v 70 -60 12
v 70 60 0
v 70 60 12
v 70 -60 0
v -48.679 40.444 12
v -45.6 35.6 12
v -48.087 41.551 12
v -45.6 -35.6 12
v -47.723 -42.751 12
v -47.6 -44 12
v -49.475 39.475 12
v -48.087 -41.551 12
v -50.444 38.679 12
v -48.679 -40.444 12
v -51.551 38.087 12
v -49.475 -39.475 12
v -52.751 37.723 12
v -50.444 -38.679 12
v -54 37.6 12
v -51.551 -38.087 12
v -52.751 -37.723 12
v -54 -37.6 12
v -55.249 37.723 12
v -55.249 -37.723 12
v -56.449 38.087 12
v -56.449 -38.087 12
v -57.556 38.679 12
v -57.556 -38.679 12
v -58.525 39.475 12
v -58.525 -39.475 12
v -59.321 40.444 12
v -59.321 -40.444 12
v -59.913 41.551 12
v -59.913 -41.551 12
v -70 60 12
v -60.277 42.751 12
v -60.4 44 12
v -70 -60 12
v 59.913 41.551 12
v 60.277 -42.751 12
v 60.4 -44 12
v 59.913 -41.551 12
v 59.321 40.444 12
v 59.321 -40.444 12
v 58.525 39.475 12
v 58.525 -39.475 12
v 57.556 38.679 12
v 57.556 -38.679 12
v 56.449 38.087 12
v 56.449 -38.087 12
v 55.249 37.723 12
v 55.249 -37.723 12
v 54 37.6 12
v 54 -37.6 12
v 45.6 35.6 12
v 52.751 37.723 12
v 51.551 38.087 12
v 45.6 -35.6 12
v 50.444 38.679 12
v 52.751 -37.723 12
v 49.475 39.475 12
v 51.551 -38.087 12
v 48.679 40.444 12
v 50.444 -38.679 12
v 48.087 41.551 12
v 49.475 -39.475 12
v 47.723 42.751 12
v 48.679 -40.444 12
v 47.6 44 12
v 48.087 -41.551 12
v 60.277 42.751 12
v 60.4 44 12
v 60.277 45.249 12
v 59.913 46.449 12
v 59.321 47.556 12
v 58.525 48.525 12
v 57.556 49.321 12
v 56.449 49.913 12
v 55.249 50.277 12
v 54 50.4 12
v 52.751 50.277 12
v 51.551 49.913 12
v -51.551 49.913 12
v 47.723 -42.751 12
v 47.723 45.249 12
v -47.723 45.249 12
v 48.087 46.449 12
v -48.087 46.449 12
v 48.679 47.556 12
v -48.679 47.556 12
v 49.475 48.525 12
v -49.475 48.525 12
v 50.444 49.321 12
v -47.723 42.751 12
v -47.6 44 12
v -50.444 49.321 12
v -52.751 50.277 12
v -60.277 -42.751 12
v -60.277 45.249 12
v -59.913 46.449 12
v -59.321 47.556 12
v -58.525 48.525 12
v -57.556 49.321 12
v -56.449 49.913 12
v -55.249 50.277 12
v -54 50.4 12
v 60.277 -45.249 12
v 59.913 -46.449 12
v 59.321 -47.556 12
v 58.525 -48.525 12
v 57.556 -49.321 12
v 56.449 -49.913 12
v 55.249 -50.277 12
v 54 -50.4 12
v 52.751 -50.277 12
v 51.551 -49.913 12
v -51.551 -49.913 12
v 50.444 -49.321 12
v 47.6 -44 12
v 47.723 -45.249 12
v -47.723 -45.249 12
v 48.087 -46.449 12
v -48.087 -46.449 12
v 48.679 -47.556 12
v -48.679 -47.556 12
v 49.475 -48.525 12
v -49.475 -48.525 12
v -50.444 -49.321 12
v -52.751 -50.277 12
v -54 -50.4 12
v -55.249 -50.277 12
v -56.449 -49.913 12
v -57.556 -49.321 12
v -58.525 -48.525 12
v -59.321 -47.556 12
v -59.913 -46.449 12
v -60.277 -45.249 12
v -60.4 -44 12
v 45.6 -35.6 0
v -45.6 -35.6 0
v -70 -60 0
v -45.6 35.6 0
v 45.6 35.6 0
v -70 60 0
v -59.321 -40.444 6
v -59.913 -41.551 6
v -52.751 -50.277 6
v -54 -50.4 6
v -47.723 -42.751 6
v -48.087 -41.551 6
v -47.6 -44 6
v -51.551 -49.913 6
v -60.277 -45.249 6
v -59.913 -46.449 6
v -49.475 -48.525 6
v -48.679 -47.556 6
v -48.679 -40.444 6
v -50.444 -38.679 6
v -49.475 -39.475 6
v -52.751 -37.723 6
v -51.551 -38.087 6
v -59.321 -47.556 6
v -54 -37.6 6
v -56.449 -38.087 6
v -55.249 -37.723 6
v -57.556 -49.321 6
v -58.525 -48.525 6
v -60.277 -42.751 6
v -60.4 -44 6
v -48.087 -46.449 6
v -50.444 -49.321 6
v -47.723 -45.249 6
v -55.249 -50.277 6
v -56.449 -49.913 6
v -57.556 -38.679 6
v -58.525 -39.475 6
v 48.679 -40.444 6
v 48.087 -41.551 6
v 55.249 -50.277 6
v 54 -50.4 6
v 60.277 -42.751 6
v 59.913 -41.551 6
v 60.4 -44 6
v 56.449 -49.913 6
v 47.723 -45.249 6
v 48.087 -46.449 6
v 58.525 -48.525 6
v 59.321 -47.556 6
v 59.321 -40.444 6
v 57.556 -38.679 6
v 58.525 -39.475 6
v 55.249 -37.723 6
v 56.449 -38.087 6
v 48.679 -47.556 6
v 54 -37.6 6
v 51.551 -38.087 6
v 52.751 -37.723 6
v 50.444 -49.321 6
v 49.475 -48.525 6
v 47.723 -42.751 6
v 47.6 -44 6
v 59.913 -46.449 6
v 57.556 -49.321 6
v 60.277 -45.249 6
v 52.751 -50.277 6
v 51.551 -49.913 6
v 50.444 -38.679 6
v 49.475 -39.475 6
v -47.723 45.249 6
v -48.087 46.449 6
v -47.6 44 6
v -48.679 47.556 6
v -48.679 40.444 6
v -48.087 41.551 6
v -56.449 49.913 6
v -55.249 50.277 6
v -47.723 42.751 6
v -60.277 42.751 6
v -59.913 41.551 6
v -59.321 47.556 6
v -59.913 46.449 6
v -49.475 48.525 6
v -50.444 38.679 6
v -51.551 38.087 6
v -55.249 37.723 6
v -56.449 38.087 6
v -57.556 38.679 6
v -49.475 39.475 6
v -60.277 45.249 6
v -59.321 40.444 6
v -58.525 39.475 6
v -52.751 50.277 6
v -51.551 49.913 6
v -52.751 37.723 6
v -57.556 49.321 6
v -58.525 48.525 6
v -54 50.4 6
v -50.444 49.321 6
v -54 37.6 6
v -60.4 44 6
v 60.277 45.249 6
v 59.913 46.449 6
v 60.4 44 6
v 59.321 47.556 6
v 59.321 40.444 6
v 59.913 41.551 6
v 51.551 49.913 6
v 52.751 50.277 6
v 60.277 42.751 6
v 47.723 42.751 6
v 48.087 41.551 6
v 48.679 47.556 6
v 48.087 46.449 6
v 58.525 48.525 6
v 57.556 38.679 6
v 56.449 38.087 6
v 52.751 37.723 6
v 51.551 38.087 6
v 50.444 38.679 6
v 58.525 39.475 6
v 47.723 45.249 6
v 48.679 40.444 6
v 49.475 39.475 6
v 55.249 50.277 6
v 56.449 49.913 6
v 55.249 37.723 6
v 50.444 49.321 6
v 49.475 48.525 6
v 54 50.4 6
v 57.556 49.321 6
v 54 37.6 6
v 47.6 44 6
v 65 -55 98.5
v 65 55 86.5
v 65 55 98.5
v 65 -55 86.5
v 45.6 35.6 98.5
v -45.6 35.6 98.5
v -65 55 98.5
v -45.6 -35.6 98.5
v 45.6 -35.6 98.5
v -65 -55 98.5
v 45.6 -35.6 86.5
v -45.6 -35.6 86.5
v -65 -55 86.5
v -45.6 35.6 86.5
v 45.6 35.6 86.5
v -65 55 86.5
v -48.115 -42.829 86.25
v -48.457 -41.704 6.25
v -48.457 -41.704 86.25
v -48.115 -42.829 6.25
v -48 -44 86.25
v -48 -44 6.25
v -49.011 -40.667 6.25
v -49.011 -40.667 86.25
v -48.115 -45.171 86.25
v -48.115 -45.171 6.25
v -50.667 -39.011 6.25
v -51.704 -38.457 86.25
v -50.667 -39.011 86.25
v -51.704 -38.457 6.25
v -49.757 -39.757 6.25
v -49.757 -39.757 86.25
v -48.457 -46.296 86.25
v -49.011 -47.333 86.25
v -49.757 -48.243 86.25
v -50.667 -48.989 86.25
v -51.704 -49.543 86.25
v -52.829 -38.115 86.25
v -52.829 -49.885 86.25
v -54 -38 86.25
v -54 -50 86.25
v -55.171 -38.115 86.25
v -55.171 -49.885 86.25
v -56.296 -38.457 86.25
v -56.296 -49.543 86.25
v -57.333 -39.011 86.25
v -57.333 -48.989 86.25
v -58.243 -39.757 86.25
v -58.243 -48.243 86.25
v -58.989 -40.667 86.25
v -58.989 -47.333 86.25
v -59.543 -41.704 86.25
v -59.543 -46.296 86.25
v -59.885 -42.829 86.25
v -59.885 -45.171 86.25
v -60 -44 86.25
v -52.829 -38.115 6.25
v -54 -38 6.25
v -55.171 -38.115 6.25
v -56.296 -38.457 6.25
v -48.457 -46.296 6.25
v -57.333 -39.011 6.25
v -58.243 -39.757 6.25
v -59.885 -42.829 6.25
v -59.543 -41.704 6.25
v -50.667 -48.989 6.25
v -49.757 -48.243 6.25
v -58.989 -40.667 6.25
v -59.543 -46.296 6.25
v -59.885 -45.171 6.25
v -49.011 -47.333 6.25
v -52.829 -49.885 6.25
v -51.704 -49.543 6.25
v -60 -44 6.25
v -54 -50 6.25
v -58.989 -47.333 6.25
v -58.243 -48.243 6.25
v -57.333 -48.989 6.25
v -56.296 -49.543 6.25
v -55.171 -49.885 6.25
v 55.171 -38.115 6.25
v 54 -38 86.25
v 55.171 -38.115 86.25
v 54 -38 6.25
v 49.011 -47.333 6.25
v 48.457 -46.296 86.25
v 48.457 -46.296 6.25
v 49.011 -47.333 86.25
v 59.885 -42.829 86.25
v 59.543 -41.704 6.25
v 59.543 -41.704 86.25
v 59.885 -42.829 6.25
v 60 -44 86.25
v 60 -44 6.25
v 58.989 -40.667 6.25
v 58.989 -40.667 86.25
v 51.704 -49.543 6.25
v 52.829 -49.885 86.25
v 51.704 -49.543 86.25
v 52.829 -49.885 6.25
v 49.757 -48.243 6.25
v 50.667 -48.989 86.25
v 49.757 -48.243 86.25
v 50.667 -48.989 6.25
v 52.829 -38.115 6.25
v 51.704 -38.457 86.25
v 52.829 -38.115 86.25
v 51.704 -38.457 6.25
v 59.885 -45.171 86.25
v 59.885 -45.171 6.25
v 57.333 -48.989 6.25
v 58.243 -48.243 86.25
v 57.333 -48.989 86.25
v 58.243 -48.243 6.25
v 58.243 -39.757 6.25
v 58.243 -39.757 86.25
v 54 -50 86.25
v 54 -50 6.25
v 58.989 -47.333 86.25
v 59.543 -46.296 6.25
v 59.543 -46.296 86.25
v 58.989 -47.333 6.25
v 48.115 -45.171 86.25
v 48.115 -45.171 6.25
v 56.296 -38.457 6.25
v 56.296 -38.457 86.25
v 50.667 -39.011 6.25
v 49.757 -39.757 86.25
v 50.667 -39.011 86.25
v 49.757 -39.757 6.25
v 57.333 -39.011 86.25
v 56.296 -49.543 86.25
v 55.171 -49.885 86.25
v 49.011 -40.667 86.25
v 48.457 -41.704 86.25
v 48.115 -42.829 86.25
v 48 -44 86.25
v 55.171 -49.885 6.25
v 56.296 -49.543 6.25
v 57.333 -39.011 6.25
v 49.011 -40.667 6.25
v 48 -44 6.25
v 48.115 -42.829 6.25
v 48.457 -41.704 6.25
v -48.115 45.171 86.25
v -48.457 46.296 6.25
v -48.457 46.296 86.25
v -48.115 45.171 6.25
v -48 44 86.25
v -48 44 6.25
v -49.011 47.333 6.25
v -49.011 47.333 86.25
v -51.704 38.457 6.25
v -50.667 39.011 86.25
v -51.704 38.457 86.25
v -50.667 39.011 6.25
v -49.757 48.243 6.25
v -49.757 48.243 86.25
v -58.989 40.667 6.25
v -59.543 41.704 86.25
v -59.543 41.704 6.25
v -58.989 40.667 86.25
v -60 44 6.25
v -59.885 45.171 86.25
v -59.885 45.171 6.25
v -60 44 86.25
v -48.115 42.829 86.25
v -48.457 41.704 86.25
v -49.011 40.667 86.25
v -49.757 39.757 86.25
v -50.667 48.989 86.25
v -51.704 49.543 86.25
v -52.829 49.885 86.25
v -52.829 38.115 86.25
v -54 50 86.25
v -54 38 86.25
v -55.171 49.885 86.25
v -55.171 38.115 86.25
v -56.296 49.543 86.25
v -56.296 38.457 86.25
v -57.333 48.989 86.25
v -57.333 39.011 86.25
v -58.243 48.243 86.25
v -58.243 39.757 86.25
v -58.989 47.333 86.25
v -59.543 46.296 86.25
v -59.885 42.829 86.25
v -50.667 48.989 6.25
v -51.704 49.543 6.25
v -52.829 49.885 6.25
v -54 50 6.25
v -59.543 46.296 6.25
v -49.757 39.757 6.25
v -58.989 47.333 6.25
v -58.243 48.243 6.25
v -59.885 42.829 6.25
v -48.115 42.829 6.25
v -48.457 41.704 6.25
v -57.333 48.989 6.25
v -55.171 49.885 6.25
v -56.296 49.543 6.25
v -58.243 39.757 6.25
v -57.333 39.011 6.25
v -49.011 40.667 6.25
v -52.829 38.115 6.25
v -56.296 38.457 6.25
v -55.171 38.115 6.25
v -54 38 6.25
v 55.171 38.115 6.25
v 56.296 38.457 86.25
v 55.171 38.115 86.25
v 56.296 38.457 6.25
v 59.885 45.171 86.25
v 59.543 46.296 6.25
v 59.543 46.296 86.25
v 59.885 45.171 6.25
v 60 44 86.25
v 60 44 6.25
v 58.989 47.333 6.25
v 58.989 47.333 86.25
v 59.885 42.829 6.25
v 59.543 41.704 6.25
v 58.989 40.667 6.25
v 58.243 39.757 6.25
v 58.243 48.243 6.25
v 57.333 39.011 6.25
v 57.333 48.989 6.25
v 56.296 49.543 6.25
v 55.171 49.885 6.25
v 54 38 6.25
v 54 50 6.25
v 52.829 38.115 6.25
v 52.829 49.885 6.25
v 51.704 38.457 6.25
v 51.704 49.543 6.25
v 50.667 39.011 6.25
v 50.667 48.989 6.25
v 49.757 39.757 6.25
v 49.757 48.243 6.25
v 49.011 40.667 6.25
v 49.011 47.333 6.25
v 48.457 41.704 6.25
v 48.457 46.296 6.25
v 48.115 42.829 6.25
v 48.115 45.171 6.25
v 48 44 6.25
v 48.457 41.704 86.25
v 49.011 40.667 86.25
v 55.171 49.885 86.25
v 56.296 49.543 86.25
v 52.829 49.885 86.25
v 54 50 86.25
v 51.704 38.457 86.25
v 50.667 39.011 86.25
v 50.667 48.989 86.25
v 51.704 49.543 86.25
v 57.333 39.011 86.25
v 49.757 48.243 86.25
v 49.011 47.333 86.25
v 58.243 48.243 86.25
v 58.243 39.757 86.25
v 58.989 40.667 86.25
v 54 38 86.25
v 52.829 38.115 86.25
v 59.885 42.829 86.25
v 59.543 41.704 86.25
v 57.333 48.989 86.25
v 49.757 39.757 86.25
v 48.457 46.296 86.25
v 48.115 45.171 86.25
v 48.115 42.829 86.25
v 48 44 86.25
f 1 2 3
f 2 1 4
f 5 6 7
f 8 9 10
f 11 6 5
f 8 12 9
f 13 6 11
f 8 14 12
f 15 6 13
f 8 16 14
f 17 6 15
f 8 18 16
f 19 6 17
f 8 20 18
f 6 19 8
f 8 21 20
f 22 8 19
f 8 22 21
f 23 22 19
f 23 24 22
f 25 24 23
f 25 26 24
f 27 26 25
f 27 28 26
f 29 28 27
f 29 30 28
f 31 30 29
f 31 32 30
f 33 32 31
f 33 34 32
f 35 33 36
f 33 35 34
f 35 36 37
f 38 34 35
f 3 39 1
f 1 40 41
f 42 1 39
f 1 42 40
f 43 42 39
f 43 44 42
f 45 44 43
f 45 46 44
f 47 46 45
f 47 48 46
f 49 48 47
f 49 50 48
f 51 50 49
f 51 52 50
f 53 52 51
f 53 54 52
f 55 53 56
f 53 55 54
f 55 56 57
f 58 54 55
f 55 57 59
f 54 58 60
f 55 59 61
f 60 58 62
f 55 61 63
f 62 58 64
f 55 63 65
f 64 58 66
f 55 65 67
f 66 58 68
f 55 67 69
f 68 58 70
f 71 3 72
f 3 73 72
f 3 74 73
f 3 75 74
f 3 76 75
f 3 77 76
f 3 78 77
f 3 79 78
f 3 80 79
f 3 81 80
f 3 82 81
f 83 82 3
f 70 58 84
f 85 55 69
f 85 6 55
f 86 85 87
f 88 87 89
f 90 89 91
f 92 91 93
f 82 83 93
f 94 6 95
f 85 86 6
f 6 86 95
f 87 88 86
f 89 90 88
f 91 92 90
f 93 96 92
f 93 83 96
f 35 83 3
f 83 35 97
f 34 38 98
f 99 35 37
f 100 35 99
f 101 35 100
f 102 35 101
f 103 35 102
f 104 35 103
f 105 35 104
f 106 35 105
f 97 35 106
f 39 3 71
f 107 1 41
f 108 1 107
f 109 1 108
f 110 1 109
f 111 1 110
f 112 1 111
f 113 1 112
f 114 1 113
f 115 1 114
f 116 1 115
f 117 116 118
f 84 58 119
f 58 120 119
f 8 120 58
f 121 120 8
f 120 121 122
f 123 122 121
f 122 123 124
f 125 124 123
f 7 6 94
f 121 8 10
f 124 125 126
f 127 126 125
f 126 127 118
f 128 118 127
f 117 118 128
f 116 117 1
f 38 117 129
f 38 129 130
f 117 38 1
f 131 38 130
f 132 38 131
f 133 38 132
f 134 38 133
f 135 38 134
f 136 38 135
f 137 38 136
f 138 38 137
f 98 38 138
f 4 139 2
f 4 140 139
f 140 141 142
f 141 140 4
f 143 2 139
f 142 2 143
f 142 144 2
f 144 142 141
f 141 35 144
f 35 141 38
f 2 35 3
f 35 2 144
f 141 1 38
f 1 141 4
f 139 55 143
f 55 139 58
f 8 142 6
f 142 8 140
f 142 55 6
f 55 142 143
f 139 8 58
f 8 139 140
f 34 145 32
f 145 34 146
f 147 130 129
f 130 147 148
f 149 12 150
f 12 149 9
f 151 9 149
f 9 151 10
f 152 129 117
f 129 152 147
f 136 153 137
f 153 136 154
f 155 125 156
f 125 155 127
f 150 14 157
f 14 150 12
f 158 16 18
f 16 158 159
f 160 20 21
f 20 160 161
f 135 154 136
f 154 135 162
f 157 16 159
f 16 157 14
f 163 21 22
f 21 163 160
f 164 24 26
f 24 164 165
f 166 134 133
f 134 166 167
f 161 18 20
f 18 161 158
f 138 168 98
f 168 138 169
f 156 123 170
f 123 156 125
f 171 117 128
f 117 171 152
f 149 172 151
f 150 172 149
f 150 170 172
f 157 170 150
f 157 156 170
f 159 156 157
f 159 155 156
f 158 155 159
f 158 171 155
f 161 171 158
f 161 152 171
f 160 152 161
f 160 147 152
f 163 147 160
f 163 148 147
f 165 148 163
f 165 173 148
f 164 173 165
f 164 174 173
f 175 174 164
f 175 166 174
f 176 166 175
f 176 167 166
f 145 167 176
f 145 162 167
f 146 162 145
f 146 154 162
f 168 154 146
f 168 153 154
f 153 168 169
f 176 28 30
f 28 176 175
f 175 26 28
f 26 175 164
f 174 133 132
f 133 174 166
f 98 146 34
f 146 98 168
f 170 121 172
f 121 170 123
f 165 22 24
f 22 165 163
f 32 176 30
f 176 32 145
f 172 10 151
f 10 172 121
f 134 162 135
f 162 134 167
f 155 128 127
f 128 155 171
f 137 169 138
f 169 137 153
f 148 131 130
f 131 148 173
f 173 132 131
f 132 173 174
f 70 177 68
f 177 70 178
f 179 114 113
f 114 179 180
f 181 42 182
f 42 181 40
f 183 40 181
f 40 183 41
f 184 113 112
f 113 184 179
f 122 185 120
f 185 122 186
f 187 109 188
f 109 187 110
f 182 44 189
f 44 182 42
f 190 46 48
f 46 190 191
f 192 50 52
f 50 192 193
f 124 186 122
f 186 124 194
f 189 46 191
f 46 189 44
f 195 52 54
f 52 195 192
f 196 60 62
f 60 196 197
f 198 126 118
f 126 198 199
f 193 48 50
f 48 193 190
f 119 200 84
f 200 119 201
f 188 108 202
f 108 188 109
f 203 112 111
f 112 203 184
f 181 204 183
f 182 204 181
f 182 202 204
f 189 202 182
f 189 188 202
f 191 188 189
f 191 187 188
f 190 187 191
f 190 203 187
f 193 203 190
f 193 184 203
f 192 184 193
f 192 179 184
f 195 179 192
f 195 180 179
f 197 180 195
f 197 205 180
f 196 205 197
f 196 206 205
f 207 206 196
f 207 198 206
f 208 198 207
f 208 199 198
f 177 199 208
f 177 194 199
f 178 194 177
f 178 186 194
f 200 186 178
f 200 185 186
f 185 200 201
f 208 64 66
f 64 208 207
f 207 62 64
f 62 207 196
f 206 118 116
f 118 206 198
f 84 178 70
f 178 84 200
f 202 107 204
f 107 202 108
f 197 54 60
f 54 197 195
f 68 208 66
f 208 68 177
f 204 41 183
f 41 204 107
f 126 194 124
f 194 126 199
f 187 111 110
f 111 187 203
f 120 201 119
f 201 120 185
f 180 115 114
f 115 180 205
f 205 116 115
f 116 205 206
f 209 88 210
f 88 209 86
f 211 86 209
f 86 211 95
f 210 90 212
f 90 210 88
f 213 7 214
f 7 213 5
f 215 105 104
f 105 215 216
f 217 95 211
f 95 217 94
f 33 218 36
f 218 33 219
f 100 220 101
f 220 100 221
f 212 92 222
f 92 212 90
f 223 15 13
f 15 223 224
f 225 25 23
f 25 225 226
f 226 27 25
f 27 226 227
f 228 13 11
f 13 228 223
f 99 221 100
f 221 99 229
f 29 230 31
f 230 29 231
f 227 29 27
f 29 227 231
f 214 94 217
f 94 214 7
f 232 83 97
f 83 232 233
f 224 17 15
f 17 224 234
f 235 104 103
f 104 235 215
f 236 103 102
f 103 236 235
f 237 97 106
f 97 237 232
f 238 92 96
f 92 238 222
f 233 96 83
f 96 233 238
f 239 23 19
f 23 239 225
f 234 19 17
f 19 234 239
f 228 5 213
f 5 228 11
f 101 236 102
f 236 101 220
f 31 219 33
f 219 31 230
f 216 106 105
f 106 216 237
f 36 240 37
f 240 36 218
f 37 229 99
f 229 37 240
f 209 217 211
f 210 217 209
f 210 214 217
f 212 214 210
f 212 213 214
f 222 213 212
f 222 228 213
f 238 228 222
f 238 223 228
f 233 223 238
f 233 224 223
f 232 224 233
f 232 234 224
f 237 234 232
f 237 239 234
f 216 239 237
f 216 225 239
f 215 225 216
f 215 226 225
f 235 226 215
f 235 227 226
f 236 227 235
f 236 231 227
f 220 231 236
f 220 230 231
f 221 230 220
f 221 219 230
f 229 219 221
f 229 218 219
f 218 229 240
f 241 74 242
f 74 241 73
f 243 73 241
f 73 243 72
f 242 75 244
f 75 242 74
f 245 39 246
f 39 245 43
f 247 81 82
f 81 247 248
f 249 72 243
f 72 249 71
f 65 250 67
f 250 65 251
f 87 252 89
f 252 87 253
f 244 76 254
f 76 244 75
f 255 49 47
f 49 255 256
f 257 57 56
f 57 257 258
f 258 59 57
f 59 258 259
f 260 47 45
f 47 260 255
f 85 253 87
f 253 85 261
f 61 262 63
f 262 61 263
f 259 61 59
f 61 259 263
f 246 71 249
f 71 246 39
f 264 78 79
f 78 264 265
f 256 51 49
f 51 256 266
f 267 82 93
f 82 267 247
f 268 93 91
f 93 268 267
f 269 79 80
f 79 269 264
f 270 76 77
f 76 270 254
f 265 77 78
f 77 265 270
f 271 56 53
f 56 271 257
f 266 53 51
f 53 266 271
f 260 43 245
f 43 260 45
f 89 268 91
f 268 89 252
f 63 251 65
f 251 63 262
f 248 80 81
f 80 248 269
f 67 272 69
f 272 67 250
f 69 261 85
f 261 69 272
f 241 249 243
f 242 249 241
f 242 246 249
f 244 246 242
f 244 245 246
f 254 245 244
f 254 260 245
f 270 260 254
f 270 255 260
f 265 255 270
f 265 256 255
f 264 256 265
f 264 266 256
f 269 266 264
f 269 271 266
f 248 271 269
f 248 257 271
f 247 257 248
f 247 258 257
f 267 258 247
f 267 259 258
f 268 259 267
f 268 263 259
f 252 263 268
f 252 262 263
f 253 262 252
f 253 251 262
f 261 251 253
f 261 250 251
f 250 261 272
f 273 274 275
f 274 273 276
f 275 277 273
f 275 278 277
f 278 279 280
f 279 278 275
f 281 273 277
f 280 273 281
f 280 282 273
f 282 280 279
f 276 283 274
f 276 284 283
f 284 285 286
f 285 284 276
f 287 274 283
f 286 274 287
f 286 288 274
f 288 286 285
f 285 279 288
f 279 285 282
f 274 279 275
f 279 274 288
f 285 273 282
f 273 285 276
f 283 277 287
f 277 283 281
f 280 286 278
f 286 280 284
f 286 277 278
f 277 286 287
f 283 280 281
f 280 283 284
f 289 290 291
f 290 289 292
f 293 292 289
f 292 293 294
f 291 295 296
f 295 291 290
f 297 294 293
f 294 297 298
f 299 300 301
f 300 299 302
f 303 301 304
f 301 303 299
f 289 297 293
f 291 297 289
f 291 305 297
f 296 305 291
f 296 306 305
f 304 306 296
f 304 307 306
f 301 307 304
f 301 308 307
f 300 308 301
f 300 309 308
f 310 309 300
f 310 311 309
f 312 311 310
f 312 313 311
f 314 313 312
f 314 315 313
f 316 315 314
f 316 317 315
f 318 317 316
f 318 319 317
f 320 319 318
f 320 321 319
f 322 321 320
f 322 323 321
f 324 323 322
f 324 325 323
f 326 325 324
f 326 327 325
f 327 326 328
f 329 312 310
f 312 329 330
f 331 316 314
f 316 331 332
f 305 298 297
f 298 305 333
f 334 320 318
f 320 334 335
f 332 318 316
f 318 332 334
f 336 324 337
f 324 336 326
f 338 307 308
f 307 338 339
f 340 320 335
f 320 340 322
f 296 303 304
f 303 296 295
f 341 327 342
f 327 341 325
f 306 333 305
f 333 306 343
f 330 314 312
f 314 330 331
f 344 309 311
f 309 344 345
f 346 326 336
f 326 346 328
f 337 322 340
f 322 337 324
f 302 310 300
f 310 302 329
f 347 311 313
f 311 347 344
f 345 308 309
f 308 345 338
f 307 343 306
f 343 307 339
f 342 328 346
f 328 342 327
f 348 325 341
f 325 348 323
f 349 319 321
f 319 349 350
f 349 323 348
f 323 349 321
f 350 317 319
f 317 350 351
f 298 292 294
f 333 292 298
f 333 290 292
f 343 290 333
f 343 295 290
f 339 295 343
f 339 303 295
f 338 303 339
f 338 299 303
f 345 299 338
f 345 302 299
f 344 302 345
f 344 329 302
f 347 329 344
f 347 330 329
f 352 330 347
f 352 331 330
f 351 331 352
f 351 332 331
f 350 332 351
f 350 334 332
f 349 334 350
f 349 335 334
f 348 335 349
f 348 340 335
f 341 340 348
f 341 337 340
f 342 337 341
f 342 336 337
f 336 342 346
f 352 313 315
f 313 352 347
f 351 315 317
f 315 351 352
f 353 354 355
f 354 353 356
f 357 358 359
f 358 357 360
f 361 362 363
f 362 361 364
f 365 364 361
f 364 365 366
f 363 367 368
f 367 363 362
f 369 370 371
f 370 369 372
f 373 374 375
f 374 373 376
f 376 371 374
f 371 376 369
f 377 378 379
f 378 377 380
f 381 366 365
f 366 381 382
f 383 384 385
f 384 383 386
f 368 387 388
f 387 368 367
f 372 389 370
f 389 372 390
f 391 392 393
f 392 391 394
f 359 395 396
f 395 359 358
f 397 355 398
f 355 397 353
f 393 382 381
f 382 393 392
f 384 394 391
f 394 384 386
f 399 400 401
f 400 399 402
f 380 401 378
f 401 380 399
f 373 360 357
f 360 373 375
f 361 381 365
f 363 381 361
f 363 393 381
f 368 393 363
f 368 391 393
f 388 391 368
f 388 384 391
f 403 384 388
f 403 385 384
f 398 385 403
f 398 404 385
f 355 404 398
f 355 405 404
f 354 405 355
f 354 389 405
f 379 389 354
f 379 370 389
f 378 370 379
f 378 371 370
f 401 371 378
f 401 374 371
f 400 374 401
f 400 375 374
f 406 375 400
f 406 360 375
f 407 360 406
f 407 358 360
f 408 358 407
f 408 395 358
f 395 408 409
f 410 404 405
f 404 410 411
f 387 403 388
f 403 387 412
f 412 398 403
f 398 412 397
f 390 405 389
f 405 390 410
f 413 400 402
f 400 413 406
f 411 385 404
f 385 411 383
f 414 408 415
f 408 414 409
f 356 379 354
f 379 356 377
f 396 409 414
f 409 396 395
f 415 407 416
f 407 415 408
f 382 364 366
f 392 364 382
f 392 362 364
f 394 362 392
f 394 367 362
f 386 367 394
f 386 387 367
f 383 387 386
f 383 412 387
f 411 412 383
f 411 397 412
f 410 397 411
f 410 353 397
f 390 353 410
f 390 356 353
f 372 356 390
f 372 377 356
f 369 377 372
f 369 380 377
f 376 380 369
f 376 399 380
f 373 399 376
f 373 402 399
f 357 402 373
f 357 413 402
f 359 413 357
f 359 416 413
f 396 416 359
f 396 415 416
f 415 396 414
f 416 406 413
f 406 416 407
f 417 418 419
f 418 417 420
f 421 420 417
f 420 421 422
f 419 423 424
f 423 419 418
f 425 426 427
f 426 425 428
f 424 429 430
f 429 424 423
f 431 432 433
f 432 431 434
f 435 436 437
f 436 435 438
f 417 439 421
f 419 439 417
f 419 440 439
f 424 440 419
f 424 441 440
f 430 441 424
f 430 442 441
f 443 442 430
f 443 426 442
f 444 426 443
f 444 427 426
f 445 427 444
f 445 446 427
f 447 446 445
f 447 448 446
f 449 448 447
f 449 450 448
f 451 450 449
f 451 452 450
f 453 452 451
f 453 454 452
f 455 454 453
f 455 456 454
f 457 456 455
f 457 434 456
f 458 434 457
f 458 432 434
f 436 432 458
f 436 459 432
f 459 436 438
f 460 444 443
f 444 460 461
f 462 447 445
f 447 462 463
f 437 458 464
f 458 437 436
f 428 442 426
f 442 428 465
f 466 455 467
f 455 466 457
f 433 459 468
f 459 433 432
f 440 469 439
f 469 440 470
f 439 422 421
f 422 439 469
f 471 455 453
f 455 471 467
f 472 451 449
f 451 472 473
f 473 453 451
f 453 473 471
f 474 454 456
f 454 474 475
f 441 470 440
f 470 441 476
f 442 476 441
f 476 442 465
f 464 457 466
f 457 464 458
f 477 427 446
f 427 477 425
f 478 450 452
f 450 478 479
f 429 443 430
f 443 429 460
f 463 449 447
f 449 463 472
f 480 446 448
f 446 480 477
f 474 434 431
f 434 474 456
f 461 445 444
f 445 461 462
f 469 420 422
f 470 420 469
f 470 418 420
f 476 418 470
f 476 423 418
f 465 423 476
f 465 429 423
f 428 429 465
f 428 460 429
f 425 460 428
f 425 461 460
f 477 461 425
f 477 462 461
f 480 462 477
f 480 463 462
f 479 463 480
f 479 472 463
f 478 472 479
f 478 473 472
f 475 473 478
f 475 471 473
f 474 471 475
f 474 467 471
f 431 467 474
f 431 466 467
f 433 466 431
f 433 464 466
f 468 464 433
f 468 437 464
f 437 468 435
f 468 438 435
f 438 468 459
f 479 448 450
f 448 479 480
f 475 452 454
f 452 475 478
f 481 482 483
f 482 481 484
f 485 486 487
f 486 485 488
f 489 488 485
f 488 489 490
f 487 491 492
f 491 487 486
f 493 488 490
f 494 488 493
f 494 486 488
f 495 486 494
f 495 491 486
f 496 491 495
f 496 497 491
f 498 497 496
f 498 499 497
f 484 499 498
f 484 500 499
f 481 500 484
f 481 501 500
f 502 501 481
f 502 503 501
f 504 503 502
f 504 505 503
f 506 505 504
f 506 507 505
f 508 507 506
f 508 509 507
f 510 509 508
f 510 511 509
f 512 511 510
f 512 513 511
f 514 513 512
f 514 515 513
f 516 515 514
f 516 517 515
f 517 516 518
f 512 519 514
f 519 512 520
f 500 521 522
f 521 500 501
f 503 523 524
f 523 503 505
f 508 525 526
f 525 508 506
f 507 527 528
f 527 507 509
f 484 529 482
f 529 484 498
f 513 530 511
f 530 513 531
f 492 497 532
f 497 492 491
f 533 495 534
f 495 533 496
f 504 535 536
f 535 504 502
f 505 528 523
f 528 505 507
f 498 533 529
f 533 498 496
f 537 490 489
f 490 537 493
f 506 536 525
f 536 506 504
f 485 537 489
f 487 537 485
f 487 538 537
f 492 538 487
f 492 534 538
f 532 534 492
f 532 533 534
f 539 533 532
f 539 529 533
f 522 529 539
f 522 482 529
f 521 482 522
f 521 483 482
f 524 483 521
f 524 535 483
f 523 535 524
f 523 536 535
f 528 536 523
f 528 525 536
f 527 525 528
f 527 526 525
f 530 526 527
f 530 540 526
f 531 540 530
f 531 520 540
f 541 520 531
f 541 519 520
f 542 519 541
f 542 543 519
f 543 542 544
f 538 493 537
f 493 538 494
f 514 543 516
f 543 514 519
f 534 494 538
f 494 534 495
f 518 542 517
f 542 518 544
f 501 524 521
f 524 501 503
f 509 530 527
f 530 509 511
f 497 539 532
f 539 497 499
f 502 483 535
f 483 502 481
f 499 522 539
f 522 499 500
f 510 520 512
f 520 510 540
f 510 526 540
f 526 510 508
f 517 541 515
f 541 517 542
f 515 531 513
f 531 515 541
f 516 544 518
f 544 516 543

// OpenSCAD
$fn = 32;

// ------------------------------------------------------------------------
// Frame cube: base 140 x 120 mm, posts 80 mm tall
// Every part is its own module, assembly() places every instance.
// ------------------------------------------------------------------------

// --- part 1 ---
module base_frame() {
  difference() {
    translate([-70, -60, 0]) cube([140, 120, 12]);
    translate([-45.6, -35.6, -1]) cube([91.2, 71.2, 14]);
    translate([-54, -44, 6]) cylinder(h = 7, d = 12.8);
    translate([54, -44, 6]) cylinder(h = 7, d = 12.8);
    translate([-54, 44, 6]) cylinder(h = 7, d = 12.8);
    translate([54, 44, 6]) cylinder(h = 7, d = 12.8);
  }
}

// --- part 2 ---
module corner_post() {
  cylinder(h = 80, d = 12);
}

// --- part 3 ---
module top_frame() {
  difference() {
    translate([-65, -55, 0]) cube([130, 110, 12]);
    translate([-45.6, -35.6, -1]) cube([91.2, 71.2, 14]);
  }
}

// --- assembly ---
module assembly() {
  color([0.80, 0.24, 0.20]) translate([0, 0, 0]) rotate([0, 0, 0]) base_frame();
  color([0.20, 0.45, 0.75]) translate([-54, -44, 6.25]) rotate([0, 0, 0]) corner_post();
  color([0.25, 0.62, 0.32]) translate([54, -44, 6.25]) rotate([0, 0, 0]) corner_post();
  color([0.92, 0.70, 0.18]) translate([-54, 44, 6.25]) rotate([0, 0, 0]) corner_post();
  color([0.58, 0.35, 0.70]) translate([54, 44, 6.25]) rotate([0, 0, 0]) corner_post();
  color([0.16, 0.66, 0.66]) translate([0, 0, 86.5]) rotate([0, 0, 0]) top_frame();
}

assembly();
